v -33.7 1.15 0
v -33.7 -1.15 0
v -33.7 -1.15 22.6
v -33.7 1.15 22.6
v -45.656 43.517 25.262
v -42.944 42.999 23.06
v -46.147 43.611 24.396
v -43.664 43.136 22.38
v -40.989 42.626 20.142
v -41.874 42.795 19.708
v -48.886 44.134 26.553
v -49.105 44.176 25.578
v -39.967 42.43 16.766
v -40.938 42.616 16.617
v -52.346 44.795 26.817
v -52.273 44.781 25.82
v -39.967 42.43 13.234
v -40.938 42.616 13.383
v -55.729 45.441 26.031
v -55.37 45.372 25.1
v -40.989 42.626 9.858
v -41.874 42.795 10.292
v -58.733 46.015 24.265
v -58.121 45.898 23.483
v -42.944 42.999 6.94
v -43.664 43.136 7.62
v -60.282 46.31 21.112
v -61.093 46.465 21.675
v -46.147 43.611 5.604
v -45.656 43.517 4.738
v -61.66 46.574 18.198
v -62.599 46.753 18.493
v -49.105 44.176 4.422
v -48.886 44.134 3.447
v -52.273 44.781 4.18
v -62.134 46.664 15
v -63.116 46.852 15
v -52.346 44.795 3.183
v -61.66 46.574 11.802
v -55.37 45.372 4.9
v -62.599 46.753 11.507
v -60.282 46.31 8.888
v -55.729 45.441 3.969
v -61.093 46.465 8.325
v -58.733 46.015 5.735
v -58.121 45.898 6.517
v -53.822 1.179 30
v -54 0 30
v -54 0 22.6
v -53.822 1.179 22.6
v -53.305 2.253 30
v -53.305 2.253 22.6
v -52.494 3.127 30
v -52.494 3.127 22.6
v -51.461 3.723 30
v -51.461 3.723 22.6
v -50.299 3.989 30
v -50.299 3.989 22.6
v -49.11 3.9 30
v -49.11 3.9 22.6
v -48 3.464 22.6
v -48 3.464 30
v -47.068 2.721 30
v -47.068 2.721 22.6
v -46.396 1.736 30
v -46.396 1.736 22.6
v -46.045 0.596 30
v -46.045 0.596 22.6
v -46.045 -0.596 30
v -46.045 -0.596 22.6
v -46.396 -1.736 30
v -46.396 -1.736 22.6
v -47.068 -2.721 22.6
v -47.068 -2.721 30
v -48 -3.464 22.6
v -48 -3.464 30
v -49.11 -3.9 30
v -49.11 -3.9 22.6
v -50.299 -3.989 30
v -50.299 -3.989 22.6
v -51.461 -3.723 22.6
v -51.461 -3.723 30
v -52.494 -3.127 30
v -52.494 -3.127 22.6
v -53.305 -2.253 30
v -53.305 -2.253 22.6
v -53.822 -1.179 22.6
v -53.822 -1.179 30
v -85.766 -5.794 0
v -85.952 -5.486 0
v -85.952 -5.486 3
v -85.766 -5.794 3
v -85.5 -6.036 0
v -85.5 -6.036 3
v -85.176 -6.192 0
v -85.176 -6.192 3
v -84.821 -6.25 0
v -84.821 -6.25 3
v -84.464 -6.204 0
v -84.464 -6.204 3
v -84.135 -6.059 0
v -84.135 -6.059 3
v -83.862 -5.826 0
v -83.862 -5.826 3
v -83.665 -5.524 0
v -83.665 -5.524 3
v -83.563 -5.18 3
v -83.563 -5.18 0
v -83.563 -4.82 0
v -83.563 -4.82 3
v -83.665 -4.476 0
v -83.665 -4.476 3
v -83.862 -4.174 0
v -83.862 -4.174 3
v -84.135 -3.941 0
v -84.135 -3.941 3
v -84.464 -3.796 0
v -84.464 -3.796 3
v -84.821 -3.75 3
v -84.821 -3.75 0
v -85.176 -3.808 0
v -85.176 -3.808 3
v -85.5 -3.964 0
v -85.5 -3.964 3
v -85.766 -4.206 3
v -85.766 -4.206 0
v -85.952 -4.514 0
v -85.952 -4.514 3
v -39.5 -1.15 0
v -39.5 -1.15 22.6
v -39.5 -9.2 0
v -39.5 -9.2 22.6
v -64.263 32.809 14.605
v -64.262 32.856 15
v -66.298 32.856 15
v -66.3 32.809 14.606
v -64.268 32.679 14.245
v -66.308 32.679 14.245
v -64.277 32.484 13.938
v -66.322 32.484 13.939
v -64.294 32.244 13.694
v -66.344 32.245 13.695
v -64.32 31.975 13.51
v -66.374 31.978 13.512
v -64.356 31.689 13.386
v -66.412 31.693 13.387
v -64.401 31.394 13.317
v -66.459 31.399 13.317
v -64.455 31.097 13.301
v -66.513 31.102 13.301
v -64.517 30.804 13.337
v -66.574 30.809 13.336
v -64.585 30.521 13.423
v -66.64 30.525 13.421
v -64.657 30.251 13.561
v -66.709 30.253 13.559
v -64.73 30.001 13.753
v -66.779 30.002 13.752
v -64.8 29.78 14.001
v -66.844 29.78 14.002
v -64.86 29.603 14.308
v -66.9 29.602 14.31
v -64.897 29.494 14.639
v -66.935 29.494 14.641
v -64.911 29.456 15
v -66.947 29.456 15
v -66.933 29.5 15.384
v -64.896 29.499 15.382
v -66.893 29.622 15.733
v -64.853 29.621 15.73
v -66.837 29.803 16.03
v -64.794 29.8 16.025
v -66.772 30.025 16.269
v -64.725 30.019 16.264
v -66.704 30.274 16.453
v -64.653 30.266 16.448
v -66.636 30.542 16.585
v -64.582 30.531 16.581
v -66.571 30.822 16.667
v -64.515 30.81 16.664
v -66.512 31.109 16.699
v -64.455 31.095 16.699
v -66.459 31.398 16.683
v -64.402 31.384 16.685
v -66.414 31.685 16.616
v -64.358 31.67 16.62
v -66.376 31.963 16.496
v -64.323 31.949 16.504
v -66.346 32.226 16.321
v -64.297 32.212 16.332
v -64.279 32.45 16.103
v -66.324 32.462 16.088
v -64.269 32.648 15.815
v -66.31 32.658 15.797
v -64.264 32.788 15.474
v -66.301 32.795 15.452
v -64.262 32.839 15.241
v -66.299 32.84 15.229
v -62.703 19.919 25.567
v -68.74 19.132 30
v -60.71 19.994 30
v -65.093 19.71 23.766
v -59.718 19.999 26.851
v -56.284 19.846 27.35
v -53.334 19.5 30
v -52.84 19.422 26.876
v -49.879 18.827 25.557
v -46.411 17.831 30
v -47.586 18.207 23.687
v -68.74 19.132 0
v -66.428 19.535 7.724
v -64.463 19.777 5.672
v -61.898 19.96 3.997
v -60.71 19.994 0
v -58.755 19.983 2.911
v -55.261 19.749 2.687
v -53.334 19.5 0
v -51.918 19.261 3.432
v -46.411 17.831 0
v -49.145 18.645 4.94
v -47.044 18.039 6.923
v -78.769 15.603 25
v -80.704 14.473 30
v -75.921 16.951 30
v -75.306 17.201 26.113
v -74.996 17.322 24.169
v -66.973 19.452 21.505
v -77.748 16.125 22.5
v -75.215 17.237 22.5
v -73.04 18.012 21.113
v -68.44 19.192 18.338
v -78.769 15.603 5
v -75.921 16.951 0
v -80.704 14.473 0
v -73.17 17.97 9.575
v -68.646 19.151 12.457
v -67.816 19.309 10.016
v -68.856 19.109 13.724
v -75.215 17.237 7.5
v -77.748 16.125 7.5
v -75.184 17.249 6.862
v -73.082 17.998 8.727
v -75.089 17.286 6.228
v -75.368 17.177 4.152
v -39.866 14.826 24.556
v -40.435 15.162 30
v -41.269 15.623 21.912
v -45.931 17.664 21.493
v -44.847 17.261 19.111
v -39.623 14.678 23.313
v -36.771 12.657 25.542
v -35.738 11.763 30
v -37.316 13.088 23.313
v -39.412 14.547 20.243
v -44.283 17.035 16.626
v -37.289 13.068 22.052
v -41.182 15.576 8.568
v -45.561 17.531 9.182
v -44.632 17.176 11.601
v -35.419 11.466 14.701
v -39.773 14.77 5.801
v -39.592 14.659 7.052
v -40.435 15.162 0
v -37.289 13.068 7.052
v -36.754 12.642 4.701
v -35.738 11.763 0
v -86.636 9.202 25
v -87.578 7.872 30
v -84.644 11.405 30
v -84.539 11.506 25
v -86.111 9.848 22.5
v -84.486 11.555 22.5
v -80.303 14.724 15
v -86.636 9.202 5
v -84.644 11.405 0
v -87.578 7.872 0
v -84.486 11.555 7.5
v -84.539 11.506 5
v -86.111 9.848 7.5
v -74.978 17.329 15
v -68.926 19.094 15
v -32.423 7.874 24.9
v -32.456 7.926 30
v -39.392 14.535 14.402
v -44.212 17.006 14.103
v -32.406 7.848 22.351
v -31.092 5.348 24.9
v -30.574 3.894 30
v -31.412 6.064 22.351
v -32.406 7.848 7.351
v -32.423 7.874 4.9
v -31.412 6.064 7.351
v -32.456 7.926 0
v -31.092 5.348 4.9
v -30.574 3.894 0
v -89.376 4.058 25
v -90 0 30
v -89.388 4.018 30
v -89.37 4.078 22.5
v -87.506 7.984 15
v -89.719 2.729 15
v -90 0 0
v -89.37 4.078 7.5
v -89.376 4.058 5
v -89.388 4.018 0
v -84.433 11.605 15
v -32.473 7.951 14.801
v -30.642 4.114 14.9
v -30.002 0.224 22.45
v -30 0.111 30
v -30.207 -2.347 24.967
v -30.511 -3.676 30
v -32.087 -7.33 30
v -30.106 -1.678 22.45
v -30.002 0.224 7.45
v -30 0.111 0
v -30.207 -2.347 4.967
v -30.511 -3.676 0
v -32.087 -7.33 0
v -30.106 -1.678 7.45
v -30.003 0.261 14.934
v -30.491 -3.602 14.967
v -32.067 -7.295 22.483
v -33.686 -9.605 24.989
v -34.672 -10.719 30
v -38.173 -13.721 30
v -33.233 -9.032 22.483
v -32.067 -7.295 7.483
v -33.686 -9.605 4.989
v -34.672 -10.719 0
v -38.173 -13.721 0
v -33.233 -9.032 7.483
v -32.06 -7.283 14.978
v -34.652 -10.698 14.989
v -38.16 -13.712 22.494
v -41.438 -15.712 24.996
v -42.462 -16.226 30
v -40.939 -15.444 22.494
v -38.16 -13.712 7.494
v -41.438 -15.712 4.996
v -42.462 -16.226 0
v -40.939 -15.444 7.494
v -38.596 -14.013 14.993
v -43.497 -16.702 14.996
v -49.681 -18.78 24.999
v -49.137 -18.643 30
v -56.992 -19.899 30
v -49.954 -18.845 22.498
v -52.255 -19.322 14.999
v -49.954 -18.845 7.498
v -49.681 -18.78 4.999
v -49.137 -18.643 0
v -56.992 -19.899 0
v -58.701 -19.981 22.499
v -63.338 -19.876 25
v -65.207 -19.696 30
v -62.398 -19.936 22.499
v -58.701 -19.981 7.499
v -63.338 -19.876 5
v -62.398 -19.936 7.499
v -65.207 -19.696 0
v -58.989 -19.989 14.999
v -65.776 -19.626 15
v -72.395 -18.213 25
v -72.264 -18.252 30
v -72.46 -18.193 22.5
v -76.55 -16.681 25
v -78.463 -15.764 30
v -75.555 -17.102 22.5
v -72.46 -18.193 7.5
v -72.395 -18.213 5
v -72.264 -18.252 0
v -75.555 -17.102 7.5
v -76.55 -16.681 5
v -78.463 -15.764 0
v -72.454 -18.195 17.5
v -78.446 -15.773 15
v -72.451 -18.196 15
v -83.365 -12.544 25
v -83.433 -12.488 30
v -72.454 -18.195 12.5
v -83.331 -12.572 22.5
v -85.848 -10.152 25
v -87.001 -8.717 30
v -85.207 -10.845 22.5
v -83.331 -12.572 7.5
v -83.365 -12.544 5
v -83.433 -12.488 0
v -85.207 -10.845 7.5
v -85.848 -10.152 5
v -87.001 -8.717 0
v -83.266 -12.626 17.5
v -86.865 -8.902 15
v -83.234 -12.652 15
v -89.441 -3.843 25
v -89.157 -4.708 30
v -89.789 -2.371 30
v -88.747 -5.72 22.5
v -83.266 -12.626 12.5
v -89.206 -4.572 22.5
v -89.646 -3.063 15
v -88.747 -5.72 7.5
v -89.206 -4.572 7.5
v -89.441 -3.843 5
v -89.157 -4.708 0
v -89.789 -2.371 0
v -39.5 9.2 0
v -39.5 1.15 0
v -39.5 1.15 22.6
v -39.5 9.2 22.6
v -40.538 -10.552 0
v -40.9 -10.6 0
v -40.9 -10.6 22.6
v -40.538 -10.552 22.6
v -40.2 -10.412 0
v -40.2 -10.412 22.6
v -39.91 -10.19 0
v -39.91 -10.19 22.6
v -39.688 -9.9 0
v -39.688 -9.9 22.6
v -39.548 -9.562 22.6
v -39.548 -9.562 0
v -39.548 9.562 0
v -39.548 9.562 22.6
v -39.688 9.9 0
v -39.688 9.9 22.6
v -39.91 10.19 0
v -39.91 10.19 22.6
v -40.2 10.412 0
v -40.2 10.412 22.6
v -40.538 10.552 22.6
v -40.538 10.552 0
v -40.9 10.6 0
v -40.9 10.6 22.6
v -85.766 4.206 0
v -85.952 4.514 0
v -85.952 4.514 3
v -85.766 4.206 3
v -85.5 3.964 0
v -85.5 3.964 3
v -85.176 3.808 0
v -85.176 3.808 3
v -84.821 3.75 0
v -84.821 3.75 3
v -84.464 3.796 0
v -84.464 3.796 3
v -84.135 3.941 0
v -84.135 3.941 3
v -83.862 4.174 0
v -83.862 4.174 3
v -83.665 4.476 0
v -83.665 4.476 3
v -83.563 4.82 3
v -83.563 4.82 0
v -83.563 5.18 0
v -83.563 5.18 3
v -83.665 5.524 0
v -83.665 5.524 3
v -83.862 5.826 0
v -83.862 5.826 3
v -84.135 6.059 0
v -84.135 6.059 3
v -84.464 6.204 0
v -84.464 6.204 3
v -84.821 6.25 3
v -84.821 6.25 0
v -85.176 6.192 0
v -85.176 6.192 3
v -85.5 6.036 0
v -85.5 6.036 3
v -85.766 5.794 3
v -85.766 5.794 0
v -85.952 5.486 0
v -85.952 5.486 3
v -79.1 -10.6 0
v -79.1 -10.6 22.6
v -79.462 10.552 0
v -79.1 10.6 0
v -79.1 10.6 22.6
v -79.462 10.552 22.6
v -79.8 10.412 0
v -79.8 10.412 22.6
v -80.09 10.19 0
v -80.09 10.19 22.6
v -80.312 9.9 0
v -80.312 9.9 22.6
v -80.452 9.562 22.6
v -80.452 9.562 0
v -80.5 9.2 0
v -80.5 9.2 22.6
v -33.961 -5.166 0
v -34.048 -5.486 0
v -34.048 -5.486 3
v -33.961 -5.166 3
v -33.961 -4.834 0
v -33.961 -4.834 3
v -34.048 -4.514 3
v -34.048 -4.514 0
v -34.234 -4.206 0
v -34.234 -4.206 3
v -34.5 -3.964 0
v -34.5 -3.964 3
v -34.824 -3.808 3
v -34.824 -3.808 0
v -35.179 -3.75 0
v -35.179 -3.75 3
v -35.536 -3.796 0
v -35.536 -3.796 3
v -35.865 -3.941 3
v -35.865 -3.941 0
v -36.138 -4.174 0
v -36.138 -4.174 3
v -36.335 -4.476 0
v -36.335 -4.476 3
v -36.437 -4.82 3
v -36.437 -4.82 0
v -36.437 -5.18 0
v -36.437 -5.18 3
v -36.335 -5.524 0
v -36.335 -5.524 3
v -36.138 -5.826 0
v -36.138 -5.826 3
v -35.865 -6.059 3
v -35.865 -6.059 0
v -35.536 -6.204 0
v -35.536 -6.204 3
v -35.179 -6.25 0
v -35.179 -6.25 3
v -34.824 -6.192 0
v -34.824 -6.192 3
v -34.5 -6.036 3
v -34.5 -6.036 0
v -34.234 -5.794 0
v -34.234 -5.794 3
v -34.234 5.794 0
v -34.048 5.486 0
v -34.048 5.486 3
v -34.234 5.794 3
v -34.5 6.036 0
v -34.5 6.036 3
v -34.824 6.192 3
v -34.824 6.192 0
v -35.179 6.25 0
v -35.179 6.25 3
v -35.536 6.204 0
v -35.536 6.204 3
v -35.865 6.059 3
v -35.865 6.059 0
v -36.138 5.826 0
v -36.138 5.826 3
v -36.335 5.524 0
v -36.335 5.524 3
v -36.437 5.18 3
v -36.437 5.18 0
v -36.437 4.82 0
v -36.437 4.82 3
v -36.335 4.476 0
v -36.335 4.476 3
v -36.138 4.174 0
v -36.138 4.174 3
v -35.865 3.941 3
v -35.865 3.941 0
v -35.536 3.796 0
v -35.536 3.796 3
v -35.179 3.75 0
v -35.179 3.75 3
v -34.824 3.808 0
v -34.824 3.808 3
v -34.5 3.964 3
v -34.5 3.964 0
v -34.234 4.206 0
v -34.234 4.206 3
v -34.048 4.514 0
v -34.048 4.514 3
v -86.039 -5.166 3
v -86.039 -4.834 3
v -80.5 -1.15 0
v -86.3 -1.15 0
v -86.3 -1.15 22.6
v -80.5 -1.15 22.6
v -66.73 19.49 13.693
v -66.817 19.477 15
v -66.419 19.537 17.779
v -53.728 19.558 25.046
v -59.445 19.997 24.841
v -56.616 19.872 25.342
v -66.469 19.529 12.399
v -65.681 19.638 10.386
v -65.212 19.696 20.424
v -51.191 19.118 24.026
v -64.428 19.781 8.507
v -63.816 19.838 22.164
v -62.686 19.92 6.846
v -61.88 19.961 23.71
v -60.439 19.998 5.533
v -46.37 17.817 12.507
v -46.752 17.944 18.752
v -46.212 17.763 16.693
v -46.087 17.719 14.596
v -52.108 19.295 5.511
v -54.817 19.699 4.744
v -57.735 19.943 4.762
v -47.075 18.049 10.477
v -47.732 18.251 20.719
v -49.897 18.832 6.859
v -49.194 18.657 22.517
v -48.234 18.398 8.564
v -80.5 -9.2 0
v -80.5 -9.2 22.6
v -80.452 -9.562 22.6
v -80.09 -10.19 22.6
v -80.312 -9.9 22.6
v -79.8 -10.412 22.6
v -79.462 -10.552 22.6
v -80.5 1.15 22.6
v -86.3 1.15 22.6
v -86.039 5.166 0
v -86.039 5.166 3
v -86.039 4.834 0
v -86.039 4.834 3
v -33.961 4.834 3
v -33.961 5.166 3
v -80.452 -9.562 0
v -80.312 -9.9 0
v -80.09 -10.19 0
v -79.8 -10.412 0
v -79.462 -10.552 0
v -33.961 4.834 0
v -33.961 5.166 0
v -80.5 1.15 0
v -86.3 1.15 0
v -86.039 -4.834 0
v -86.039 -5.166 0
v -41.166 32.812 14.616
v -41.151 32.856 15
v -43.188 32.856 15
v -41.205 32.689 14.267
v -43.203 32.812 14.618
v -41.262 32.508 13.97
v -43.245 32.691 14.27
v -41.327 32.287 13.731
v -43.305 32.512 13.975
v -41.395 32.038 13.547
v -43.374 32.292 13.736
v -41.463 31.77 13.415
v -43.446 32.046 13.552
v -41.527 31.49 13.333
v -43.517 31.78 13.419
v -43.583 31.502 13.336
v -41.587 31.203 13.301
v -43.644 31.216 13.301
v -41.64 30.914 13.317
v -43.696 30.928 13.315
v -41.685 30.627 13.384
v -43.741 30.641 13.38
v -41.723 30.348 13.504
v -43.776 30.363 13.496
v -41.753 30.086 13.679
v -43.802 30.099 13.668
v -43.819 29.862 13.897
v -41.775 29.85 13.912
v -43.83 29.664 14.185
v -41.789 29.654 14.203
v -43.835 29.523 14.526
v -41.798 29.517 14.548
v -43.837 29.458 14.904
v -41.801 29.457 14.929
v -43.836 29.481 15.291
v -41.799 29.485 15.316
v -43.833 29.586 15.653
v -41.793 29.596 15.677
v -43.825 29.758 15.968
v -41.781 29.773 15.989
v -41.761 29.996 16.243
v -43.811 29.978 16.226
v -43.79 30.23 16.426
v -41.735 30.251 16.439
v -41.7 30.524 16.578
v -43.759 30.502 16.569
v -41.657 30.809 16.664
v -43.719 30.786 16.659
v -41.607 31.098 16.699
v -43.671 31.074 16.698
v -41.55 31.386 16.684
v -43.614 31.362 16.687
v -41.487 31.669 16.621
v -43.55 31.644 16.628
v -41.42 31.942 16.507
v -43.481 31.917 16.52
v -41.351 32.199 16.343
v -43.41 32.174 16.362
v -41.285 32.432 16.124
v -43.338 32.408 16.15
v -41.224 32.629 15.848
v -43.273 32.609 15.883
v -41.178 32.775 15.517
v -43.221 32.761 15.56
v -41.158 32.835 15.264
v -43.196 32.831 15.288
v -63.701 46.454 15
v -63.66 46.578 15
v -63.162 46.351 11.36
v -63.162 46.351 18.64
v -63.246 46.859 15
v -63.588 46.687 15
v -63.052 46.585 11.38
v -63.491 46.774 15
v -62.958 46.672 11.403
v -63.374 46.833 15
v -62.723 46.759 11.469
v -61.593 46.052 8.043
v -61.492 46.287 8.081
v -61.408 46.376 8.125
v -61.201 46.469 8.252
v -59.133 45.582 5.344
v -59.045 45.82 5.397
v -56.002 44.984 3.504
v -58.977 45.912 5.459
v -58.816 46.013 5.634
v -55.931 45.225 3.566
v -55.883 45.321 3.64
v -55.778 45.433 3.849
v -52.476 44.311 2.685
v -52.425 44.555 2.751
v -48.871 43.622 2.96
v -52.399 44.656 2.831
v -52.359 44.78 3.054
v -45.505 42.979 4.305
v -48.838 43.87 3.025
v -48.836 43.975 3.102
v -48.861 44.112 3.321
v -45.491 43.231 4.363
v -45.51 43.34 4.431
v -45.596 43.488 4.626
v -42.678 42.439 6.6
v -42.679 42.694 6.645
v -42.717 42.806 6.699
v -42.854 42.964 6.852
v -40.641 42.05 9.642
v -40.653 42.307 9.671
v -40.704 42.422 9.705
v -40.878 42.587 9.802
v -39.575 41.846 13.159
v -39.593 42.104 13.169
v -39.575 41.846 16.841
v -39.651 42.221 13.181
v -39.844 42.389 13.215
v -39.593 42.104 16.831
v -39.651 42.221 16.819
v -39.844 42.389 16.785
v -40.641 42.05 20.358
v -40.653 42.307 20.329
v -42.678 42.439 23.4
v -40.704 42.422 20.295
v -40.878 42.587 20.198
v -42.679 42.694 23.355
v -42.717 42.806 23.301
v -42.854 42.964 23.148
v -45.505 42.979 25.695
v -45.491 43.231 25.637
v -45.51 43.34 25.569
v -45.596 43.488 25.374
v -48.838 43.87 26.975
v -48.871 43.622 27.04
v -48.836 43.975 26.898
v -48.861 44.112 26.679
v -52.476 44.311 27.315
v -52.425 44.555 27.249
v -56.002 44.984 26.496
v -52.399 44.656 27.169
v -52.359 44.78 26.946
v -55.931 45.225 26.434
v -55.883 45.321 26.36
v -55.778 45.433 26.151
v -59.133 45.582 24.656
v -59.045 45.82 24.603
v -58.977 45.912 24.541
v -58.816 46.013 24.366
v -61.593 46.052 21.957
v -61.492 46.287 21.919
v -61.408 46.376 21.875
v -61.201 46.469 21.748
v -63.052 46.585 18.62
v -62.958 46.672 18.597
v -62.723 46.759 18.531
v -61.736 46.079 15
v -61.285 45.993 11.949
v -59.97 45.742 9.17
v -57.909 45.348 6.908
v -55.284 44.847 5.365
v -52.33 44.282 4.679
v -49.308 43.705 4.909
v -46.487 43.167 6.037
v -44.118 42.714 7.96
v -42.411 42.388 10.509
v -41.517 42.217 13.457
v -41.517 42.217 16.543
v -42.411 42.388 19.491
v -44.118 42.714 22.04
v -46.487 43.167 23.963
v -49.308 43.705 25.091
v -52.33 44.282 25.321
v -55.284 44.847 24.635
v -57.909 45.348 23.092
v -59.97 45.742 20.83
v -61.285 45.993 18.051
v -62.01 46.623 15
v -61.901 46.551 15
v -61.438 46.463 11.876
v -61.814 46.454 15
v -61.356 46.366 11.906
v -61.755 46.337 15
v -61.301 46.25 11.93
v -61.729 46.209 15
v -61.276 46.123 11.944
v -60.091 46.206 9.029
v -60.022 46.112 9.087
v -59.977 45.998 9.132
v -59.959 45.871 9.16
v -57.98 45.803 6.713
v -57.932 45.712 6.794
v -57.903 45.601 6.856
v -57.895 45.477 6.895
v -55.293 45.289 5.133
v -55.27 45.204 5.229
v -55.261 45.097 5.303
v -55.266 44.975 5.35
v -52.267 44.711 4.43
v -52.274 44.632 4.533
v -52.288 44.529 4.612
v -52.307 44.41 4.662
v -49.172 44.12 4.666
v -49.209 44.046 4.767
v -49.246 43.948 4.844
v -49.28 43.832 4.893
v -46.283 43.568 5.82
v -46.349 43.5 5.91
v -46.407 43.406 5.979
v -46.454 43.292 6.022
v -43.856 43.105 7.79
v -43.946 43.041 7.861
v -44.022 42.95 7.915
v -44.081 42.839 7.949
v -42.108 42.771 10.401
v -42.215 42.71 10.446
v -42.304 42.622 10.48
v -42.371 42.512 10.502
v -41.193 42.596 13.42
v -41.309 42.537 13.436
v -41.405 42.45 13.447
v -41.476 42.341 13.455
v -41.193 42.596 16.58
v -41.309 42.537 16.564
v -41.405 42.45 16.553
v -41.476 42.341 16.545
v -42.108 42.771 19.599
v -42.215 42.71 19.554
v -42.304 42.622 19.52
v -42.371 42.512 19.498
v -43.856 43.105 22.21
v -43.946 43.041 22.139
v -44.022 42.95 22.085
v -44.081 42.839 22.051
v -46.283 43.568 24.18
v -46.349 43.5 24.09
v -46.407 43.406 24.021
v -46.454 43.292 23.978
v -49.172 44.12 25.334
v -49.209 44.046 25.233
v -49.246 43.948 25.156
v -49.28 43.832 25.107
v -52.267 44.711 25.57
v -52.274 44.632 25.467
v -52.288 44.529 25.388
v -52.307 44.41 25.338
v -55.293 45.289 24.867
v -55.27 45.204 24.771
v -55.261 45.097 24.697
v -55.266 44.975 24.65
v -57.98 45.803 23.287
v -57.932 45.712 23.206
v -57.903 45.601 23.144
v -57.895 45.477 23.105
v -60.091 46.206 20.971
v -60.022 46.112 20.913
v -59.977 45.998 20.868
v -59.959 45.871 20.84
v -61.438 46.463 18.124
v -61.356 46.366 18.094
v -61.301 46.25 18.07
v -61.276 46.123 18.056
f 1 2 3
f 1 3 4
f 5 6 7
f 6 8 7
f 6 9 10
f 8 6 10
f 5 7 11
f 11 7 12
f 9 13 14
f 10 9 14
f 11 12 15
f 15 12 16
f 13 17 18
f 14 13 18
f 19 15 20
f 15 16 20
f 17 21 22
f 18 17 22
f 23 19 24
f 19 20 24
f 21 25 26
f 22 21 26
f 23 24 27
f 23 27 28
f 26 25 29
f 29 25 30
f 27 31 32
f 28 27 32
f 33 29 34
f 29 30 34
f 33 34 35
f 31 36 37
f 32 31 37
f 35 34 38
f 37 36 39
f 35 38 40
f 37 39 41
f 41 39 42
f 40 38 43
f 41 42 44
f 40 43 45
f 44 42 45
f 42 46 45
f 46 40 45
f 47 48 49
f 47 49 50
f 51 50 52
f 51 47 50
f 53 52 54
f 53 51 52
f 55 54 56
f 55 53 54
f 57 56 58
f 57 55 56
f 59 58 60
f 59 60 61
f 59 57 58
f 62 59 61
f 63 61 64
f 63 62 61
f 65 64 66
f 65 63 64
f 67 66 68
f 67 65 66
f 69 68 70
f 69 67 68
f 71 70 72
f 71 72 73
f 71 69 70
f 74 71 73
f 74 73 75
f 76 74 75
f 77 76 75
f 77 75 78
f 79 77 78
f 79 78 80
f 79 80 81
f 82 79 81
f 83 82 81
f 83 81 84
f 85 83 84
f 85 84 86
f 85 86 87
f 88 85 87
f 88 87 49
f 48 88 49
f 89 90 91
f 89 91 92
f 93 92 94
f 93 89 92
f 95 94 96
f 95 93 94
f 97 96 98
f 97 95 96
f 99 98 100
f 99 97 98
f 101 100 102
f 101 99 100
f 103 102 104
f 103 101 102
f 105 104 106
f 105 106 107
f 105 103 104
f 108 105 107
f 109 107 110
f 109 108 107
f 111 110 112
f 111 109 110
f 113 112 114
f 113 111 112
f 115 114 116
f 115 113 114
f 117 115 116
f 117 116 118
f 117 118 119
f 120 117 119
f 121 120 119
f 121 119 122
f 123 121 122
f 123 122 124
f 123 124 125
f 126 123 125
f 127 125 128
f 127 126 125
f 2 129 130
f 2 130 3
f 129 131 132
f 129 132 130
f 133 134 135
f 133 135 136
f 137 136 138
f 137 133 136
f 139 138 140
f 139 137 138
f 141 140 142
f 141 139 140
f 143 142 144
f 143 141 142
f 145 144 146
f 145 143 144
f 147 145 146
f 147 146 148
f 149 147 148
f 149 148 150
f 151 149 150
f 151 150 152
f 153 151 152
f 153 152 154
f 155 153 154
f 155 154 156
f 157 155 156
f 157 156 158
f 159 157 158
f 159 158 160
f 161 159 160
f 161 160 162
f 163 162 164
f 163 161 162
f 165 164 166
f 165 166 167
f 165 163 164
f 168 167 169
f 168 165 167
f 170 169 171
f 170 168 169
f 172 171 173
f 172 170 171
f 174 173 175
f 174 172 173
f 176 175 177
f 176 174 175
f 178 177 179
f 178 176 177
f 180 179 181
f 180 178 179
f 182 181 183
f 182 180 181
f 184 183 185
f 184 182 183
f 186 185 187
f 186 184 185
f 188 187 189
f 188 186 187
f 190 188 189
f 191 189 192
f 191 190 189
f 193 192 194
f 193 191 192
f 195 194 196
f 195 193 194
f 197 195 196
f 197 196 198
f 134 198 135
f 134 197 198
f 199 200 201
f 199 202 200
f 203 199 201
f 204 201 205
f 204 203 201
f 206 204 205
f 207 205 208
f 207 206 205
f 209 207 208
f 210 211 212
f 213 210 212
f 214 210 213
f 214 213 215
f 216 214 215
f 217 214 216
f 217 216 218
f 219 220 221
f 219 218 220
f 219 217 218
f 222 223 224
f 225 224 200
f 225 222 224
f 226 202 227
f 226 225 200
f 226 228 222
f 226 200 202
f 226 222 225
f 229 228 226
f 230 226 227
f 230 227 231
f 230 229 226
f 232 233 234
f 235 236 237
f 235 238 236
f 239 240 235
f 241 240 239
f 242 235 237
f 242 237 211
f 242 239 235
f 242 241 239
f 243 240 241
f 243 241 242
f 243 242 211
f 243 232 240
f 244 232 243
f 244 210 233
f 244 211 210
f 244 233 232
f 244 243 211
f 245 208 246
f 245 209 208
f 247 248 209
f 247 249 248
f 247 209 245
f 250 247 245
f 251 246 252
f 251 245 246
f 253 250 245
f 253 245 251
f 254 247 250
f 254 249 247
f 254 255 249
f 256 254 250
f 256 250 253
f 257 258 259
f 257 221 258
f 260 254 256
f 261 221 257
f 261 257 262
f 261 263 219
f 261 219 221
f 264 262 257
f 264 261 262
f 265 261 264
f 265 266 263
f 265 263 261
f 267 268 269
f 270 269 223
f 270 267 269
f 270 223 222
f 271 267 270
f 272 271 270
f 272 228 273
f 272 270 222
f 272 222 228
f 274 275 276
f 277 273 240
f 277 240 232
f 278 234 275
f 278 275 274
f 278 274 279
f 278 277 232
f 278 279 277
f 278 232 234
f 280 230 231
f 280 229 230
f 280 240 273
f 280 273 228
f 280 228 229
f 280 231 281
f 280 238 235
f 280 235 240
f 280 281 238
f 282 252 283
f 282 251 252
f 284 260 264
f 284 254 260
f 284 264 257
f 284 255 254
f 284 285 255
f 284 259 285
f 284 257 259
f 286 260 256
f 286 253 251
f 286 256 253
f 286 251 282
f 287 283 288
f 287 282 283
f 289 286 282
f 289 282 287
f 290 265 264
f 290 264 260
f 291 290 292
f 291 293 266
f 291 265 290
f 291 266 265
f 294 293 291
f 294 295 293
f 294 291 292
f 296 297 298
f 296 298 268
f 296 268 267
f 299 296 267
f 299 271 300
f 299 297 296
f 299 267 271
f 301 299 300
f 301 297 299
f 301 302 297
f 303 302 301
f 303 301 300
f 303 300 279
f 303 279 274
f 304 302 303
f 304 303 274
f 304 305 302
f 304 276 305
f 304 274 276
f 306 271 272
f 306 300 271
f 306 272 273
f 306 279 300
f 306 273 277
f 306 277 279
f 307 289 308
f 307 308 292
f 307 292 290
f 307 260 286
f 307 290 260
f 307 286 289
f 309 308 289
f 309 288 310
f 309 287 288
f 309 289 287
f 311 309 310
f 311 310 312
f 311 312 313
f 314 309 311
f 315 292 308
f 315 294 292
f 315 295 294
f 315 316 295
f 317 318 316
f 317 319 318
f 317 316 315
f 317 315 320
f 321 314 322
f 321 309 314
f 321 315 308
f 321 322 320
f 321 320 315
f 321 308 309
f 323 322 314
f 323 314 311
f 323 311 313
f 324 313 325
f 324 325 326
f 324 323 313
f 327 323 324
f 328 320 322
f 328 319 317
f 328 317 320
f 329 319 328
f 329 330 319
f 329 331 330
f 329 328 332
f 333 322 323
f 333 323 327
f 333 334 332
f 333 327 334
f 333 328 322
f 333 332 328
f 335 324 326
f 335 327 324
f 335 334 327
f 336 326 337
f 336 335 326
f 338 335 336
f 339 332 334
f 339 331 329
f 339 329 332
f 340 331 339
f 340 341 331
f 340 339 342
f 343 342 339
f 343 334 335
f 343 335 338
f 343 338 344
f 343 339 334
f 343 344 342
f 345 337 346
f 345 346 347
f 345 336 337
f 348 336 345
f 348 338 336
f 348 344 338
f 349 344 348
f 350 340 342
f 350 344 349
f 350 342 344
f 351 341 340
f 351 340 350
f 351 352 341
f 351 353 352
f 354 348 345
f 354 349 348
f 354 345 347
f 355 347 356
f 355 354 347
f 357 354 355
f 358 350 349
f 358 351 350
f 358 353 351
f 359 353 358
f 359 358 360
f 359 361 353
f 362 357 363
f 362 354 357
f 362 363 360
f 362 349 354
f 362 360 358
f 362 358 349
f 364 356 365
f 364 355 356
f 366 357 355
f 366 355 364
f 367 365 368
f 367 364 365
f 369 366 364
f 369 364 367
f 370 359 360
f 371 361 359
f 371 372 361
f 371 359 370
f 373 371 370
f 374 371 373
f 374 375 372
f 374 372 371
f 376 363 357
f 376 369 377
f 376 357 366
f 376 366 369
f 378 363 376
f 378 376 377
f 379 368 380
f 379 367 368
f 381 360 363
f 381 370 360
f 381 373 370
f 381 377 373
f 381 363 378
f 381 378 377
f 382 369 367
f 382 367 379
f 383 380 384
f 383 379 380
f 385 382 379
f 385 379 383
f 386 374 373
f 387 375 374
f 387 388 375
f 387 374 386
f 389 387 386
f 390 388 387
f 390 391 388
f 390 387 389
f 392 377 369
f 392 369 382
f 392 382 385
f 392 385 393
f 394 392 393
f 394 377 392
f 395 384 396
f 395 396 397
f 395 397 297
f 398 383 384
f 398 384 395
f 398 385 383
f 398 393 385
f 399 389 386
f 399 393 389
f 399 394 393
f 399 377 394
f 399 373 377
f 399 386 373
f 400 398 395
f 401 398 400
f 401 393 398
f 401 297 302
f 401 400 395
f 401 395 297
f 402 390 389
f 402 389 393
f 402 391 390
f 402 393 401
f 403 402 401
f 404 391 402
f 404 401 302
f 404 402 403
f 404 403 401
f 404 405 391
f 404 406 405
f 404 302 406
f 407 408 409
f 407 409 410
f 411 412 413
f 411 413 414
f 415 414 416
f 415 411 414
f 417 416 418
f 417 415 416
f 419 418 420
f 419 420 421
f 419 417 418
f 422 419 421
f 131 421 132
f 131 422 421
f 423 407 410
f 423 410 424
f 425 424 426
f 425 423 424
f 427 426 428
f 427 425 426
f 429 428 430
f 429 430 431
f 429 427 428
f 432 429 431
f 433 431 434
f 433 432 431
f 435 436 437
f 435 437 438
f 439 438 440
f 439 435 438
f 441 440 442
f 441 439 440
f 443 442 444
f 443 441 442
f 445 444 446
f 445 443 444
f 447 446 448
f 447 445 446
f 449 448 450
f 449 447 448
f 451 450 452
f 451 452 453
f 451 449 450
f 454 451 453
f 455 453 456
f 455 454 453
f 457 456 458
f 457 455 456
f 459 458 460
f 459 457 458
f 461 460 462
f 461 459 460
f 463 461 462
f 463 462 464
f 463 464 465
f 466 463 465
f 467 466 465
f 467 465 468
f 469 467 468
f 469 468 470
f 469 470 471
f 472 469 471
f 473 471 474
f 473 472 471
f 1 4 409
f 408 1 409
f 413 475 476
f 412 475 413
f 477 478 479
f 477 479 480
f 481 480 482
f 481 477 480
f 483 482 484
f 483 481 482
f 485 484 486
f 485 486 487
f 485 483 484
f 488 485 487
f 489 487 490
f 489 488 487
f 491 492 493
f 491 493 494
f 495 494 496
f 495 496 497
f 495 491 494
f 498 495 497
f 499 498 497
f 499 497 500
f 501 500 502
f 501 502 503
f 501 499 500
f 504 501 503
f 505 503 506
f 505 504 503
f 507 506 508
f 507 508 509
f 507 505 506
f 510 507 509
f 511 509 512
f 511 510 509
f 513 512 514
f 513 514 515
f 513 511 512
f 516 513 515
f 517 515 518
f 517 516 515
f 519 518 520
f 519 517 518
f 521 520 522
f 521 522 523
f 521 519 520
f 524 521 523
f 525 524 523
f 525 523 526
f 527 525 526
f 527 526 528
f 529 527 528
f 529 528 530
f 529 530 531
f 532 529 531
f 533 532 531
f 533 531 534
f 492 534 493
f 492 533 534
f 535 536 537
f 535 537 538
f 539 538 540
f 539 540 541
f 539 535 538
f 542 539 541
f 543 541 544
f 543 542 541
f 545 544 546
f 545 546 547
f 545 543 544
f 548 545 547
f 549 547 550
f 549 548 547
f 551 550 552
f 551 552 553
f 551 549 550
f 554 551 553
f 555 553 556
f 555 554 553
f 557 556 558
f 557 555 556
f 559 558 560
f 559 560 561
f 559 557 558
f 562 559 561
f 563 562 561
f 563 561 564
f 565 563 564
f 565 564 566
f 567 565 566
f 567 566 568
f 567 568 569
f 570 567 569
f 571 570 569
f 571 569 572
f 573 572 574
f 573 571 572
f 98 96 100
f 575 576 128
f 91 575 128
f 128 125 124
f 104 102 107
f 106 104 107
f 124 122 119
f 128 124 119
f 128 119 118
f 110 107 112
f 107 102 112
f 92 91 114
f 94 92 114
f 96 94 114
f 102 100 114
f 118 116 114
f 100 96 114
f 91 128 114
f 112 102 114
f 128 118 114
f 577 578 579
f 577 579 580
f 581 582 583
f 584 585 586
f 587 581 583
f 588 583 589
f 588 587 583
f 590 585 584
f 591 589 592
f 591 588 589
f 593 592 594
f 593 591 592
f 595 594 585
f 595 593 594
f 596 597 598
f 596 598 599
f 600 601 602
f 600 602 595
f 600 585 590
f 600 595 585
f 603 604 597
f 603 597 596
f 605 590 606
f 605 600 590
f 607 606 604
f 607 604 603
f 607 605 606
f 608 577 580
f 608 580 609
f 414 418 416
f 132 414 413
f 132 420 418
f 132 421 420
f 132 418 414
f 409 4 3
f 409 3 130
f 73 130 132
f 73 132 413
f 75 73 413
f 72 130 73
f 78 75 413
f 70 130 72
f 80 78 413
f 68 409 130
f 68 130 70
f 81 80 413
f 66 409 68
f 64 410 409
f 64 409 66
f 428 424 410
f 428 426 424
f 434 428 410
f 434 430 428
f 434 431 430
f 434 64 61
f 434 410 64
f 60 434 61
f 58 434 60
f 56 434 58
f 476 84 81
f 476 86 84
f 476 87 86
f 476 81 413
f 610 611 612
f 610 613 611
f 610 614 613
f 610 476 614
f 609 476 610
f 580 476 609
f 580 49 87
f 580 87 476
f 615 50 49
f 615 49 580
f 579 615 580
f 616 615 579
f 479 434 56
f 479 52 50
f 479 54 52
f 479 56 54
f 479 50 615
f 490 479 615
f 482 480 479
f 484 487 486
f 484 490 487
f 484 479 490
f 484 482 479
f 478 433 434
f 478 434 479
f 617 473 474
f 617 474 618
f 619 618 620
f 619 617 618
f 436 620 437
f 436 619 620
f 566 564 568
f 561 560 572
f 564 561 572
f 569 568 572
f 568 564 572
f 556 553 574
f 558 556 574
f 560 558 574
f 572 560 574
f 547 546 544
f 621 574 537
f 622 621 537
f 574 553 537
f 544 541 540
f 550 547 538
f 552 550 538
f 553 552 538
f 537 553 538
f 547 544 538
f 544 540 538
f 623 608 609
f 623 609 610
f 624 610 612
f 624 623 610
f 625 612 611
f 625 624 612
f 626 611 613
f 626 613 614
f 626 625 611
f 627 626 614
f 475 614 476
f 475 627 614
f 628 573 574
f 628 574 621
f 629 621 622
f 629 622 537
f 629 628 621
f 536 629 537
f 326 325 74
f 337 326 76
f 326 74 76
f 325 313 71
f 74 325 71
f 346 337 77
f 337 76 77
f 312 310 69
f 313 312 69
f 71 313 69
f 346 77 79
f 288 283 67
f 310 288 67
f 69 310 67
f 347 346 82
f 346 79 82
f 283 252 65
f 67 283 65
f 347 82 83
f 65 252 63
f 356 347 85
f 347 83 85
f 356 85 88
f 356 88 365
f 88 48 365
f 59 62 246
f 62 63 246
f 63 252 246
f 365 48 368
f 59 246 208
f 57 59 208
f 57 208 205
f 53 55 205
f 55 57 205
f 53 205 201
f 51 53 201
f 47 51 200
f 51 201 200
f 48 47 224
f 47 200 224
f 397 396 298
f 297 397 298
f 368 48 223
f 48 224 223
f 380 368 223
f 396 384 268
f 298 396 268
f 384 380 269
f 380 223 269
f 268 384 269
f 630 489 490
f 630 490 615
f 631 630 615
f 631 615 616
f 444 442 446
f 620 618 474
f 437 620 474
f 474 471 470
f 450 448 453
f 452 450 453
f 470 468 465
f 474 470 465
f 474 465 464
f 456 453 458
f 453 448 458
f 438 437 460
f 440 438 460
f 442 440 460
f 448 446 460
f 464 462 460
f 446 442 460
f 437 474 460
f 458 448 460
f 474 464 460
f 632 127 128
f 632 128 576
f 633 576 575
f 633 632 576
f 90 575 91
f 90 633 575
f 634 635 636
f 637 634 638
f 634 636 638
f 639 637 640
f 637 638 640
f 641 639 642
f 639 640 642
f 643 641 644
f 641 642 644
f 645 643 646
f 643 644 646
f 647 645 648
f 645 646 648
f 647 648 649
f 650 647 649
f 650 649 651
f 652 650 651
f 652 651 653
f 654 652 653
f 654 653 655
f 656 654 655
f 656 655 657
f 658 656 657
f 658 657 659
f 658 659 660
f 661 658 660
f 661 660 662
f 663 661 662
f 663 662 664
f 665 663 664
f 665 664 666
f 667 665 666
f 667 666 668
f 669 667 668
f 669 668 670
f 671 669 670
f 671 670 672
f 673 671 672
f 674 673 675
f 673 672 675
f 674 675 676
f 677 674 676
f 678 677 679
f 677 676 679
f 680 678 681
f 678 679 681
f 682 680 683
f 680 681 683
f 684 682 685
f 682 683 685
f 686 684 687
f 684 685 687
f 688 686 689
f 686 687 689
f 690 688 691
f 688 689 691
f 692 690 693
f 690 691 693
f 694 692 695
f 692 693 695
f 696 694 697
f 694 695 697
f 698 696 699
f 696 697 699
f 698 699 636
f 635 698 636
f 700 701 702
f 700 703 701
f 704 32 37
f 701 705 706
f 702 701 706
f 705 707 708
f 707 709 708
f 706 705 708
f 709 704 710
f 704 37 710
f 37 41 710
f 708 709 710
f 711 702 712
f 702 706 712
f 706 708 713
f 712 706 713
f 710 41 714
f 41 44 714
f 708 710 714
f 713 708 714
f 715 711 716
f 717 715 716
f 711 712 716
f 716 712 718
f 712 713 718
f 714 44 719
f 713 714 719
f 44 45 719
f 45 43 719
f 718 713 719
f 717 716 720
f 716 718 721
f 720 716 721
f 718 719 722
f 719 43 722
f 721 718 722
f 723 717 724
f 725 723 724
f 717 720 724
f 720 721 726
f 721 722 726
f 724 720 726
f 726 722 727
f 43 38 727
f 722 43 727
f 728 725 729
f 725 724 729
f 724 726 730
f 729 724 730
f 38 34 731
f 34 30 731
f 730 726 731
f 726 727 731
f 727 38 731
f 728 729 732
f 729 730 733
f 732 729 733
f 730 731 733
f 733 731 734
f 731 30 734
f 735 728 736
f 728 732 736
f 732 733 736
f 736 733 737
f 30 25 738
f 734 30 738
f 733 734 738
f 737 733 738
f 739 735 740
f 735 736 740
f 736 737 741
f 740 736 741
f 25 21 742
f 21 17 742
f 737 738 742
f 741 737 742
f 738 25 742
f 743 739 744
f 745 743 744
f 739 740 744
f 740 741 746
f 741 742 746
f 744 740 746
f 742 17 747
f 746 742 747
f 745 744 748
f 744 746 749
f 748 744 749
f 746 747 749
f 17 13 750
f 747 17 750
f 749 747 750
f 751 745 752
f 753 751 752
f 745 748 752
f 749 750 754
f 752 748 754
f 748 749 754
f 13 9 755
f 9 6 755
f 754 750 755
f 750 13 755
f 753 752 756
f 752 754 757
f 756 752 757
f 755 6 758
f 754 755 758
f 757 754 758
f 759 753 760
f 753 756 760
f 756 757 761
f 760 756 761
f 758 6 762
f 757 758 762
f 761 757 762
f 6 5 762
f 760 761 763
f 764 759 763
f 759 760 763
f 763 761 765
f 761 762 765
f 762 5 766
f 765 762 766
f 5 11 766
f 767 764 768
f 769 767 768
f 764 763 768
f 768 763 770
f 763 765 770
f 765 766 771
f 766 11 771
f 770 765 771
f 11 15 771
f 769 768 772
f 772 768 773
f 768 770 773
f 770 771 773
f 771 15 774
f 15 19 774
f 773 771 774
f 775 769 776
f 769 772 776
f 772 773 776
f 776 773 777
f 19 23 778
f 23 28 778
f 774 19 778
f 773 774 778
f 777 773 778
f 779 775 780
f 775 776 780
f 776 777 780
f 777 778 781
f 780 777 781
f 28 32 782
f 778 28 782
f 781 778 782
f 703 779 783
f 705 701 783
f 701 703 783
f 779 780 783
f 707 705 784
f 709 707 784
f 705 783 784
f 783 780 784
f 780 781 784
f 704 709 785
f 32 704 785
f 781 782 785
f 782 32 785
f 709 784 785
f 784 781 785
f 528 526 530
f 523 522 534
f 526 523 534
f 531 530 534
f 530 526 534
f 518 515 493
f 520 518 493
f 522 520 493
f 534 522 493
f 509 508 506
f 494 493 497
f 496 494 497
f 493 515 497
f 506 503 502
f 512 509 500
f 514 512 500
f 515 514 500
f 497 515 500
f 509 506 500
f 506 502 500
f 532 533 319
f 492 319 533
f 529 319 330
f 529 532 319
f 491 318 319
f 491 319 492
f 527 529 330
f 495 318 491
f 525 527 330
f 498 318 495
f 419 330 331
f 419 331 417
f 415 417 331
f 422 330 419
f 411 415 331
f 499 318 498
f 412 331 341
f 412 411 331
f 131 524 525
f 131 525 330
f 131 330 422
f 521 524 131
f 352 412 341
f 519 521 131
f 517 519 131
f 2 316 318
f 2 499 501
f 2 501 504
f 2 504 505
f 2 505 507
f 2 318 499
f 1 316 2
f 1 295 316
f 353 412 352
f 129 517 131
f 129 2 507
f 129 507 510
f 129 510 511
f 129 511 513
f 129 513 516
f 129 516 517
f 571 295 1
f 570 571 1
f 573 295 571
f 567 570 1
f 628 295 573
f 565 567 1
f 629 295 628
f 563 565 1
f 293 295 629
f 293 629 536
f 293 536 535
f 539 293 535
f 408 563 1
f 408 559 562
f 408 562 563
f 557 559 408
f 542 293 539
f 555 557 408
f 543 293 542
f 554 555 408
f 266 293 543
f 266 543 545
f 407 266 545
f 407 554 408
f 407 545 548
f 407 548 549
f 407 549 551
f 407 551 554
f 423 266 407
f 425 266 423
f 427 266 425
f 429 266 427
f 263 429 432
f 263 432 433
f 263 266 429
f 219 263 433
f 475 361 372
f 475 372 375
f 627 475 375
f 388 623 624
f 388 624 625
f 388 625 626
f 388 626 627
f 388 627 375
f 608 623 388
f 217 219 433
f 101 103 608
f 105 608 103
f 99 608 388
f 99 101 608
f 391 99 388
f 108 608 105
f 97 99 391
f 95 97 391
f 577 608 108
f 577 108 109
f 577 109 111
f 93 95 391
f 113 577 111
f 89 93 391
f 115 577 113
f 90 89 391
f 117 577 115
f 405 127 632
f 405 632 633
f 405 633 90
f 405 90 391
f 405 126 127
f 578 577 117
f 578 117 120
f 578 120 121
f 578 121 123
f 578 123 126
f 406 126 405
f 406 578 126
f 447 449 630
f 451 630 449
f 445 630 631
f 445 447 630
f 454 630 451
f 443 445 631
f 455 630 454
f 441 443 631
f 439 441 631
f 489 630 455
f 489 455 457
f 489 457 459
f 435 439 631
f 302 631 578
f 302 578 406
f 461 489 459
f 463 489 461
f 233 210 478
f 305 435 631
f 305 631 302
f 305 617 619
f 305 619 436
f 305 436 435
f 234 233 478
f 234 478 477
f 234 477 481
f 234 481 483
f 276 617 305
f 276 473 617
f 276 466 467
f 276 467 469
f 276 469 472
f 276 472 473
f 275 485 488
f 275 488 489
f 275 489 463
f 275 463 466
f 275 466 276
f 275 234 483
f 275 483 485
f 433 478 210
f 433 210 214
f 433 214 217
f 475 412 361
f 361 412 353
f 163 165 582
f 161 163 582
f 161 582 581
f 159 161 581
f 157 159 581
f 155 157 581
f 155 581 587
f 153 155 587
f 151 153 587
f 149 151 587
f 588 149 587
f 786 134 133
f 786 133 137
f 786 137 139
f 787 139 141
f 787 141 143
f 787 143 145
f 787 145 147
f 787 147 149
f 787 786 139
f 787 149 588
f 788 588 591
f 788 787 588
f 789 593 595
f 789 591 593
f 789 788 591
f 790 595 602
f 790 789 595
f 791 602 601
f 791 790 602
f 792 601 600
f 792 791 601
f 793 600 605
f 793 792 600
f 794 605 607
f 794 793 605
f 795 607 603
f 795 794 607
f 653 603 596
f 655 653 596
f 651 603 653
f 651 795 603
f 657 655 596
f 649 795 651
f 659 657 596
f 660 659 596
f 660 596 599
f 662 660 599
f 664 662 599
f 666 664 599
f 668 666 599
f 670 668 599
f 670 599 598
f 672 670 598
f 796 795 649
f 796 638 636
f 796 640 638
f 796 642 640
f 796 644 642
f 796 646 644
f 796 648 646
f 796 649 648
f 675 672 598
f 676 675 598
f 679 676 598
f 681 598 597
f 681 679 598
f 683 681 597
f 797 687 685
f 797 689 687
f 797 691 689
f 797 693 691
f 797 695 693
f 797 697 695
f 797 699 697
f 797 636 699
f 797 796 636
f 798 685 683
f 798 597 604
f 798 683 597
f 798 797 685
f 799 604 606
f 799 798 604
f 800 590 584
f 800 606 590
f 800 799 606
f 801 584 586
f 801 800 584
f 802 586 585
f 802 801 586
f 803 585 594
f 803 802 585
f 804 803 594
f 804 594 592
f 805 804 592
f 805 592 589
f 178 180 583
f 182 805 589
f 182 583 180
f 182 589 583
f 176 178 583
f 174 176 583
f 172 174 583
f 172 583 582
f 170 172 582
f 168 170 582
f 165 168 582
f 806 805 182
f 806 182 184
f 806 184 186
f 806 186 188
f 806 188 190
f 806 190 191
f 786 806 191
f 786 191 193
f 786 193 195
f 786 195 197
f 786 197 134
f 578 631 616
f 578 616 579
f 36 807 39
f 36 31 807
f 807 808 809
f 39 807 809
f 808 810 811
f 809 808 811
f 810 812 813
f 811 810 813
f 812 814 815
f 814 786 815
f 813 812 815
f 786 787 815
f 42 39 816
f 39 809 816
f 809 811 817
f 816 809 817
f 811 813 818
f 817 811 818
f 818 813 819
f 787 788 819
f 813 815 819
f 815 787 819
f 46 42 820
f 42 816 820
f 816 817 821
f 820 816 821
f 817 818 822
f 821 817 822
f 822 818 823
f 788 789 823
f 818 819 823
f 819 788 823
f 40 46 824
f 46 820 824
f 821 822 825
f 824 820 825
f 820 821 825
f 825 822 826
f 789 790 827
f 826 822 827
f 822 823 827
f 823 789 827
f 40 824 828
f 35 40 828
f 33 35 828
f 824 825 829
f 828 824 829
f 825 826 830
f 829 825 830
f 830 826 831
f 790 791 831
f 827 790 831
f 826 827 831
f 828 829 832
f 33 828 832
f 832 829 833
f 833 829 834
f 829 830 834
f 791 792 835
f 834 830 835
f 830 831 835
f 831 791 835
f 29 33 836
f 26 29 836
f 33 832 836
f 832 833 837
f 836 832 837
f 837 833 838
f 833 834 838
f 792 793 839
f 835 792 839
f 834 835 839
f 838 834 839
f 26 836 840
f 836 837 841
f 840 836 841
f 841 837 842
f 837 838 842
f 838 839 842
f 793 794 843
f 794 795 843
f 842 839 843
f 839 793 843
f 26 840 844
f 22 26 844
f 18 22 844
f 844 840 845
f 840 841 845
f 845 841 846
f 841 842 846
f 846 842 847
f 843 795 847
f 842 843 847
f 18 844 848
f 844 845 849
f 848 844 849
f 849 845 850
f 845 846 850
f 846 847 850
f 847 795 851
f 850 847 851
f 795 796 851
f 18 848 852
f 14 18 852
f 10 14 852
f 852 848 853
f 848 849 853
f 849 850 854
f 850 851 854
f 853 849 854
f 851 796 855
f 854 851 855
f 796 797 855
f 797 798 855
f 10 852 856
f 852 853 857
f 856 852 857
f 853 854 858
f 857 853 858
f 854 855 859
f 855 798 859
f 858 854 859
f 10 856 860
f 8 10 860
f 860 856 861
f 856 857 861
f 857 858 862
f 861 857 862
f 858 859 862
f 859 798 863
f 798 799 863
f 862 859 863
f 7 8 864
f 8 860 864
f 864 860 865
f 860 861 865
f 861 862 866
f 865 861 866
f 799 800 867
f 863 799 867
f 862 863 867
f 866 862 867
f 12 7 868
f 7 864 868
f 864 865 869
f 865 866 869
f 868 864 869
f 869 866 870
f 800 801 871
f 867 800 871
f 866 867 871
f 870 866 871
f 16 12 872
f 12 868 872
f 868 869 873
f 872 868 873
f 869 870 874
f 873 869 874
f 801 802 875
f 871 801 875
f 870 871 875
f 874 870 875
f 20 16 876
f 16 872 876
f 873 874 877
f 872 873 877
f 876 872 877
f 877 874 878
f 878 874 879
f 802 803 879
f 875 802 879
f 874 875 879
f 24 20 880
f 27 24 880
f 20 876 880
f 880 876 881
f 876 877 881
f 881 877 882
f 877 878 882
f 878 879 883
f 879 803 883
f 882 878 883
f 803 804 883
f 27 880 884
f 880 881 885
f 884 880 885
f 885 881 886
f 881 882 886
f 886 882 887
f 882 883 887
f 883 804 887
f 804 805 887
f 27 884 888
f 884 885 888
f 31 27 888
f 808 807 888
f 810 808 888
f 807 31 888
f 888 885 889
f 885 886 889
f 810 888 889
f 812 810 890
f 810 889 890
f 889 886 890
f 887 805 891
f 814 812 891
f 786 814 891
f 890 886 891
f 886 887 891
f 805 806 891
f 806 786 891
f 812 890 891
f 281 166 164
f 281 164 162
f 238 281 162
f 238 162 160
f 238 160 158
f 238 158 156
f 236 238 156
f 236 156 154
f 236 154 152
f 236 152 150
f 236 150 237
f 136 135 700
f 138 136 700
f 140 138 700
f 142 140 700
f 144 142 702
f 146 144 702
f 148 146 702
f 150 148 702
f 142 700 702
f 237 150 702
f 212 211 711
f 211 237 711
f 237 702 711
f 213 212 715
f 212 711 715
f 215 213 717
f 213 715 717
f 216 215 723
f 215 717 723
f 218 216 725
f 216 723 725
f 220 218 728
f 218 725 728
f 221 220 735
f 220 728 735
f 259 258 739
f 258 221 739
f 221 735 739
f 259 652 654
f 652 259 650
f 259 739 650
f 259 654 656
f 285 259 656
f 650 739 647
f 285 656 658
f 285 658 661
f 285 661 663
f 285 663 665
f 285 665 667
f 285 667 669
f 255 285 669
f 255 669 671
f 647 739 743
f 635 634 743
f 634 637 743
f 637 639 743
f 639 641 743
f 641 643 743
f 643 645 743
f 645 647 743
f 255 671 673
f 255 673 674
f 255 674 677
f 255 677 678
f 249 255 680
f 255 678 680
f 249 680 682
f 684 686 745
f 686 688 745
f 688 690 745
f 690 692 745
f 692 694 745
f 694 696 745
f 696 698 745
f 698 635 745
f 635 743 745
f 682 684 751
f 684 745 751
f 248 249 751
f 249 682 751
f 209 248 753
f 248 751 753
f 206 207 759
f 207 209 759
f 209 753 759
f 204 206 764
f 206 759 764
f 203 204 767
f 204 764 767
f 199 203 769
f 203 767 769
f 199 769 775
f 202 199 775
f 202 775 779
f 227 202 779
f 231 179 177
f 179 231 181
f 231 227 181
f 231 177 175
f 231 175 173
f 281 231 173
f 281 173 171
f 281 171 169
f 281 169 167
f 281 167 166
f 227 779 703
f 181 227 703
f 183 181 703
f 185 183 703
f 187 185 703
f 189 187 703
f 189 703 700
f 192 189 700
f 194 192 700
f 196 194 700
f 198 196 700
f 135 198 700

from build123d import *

# Parameters (mm, degrees)
SKETCH2_RX              = 30
SKETCH2_RY              = 20
BOSS_EXTRUDE1_DEPTH     = 30
CUT_EXTRUDE1_DEPTH      = 3
BOSS_EXTRUDE2_REACH     = 72.708
SKETCH7_R               = 12.35
SKETCH7_R_2             = 10.35
SKETCH8_RX              = 30
SKETCH8_RY              = 20
BOSS_EXTRUDE4_DEPTH     = 7.4
SKETCH12_R              = 1.7
CUT_EXTRUDE3_DEPTH      = 31.0000001
CUT_EXTRUDE3_DEPTH_BACK = 31.0000001
SKETCH13_R              = 4
CUT_EXTRUDE4_DEPTH      = 1.0000001
CUT_EXTRUDE4_DEPTH_BACK = 31.0000001
FILLET4_R               = 0.5


with BuildPart() as part:
    # Sketch2 → Boss-Extrude1 (new body)
    with BuildSketch(Plane.XY):
        with Locations(Location((10, 0), (0, 0, 0))):
            Ellipse(SKETCH2_RX, SKETCH2_RY)
        with BuildLine():
            Line((-3.398305936, 10.6), (7.0394788, 10.6))
            Line((7.0394788, 10.6), (29.1, 10.6))
            ThreePointArc((29.1, 10.6), (30.089949494, 10.189949494), (30.5, 9.2))
            Line((30.5, 9.2), (30.5, 1.15))
            Line((30.5, 1.15), (31.7, 1.15))
            Line((31.7, 1.15), (36.3, 1.15))
            Line((36.3, 1.15), (36.3, -1.15))
            Line((36.3, -1.15), (30.5, -1.15))
            Line((30.5, -1.15), (30.5, -9.2))
            ThreePointArc((30.5, -9.2), (30.089949494, -10.189949494), (29.1, -10.6))
            Line((29.1, -10.6), (7.0394788, -10.6))
            Line((7.0394788, -10.6), (-3.398305936, -10.6))
            Line((-3.398305936, -10.6), (-9.1, -10.6))
            ThreePointArc((-9.1, -10.6), (-10.089949494, -10.189949494), (-10.5, -9.2))
            Line((-10.5, -9.2), (-10.5, -1.15))
            Line((-10.5, -1.15), (-11.7, -1.15))
            Line((-11.7, -1.15), (-16.3, -1.15))
            Line((-16.3, -1.15), (-16.3, 1.15))
            Line((-16.3, 1.15), (-11.7, 1.15))
            Line((-11.7, 1.15), (-10.5, 1.15))
            Line((-10.5, 1.15), (-10.5, 9.2))
            ThreePointArc((-10.5, 9.2), (-10.089949494, 10.189949494), (-9.1, 10.6))
            Line((-9.1, 10.6), (-3.398305936, 10.6))
        make_face(mode=Mode.SUBTRACT)
    extrude(amount=BOSS_EXTRUDE1_DEPTH)

    # Sketch3 → Cut-Extrude1 (cut)
    with BuildSketch(Plane(origin=(0, 0, 0), x_dir=(-1, 0, 0), z_dir=(0, 0, -1))):
        with BuildLine():
            ThreePointArc((-35.95160583, -5.486111111), (-33.55, -5), (-35.95160583, -4.513888889))
            ThreePointArc((-35.95160583, -4.513888889), (-36.05, -5), (-35.95160583, -5.486111111))
        make_face()
        with BuildLine():
            ThreePointArc((-35.95160583, 4.513888889), (-33.55, 5), (-35.95160583, 5.486111111))
            ThreePointArc((-35.95160583, 5.486111111), (-36.05, 5), (-35.95160583, 4.513888889))
        make_face()
        with BuildLine():
            ThreePointArc((15.95160583, 5.486111111), (13.55, 5), (15.95160583, 4.513888889))
            ThreePointArc((15.95160583, 4.513888889), (16.05, 5), (15.95160583, 5.486111111))
        make_face()
        with BuildLine():
            ThreePointArc((15.95160583, -4.513888889), (13.55, -5), (15.95160583, -5.486111111))
            ThreePointArc((15.95160583, -5.486111111), (16.05, -5), (15.95160583, -4.513888889))
        make_face()
    extrude(amount=-CUT_EXTRUDE1_DEPTH, mode=Mode.SUBTRACT)

    # Sketch7 → Boss-Extrude2 (add, up to next)
    with BuildSketch(Plane(origin=(1.476165174, 44.628491235, 15), x_dir=(0.98224471, 0.187604184, 0), z_dir=(-0.187604184, 0.98224471, 0)), mode=Mode.PRIVATE) as boss_extrude2_sk1:
        Circle(SKETCH7_R)
        Circle(SKETCH7_R_2, mode=Mode.SUBTRACT)
    boss_extrude2_tool1 = extrude(boss_extrude2_sk1.sketch, amount=-BOSS_EXTRUDE2_REACH, mode=Mode.PRIVATE) - part.part
    add(boss_extrude2_tool1.solids().sort_by_distance((-10.311448, 42.377112, 15))[0])

    # Sketch8 → Boss-Extrude4 (add)
    with BuildSketch(Plane.XY.offset(30)):
        with Locations(Location((10, 0), (0, 0, 0))):
            Ellipse(SKETCH8_RX, SKETCH8_RY)
    extrude(amount=-BOSS_EXTRUDE4_DEPTH)

    # Sketch12 → Cut-Extrude3 (cut, two sides)
    with BuildSketch(Plane(origin=(10, -10, 0), x_dir=(0, 1, 0), z_dir=(-1, 0, 0))) as cut_extrude3_sk:
        with Locations((41.155789783, -15)):
            Circle(SKETCH12_R)
    extrude(amount=CUT_EXTRUDE3_DEPTH, mode=Mode.SUBTRACT)
    extrude(cut_extrude3_sk.sketch, amount=-CUT_EXTRUDE3_DEPTH_BACK, mode=Mode.SUBTRACT)

    # Sketch13 → Cut-Extrude4 (cut, two sides)
    with BuildSketch(Plane.XY.offset(30)) as cut_extrude4_sk:
        Circle(SKETCH13_R)
    extrude(amount=CUT_EXTRUDE4_DEPTH, mode=Mode.SUBTRACT)
    extrude(cut_extrude4_sk.sketch, amount=-CUT_EXTRUDE4_DEPTH_BACK, mode=Mode.SUBTRACT)


with BuildPart() as body_2:
    # Mirror1: mirrored copy
    add(part.part.mirror(Plane(origin=(-25, 0, 0), x_dir=(0, 0, 1), z_dir=(1, 0, 0))))

    # Fillet4
    fillet4_edges = [body_2.edges().sort_by_distance(p)[0] for p in [
        (-39.345443006, 42.311579567, 15),
        (-41.309932426, 42.686787934, 15),
    ]]
    fillet(fillet4_edges, radius=FILLET4_R)


solid = body_2.part
